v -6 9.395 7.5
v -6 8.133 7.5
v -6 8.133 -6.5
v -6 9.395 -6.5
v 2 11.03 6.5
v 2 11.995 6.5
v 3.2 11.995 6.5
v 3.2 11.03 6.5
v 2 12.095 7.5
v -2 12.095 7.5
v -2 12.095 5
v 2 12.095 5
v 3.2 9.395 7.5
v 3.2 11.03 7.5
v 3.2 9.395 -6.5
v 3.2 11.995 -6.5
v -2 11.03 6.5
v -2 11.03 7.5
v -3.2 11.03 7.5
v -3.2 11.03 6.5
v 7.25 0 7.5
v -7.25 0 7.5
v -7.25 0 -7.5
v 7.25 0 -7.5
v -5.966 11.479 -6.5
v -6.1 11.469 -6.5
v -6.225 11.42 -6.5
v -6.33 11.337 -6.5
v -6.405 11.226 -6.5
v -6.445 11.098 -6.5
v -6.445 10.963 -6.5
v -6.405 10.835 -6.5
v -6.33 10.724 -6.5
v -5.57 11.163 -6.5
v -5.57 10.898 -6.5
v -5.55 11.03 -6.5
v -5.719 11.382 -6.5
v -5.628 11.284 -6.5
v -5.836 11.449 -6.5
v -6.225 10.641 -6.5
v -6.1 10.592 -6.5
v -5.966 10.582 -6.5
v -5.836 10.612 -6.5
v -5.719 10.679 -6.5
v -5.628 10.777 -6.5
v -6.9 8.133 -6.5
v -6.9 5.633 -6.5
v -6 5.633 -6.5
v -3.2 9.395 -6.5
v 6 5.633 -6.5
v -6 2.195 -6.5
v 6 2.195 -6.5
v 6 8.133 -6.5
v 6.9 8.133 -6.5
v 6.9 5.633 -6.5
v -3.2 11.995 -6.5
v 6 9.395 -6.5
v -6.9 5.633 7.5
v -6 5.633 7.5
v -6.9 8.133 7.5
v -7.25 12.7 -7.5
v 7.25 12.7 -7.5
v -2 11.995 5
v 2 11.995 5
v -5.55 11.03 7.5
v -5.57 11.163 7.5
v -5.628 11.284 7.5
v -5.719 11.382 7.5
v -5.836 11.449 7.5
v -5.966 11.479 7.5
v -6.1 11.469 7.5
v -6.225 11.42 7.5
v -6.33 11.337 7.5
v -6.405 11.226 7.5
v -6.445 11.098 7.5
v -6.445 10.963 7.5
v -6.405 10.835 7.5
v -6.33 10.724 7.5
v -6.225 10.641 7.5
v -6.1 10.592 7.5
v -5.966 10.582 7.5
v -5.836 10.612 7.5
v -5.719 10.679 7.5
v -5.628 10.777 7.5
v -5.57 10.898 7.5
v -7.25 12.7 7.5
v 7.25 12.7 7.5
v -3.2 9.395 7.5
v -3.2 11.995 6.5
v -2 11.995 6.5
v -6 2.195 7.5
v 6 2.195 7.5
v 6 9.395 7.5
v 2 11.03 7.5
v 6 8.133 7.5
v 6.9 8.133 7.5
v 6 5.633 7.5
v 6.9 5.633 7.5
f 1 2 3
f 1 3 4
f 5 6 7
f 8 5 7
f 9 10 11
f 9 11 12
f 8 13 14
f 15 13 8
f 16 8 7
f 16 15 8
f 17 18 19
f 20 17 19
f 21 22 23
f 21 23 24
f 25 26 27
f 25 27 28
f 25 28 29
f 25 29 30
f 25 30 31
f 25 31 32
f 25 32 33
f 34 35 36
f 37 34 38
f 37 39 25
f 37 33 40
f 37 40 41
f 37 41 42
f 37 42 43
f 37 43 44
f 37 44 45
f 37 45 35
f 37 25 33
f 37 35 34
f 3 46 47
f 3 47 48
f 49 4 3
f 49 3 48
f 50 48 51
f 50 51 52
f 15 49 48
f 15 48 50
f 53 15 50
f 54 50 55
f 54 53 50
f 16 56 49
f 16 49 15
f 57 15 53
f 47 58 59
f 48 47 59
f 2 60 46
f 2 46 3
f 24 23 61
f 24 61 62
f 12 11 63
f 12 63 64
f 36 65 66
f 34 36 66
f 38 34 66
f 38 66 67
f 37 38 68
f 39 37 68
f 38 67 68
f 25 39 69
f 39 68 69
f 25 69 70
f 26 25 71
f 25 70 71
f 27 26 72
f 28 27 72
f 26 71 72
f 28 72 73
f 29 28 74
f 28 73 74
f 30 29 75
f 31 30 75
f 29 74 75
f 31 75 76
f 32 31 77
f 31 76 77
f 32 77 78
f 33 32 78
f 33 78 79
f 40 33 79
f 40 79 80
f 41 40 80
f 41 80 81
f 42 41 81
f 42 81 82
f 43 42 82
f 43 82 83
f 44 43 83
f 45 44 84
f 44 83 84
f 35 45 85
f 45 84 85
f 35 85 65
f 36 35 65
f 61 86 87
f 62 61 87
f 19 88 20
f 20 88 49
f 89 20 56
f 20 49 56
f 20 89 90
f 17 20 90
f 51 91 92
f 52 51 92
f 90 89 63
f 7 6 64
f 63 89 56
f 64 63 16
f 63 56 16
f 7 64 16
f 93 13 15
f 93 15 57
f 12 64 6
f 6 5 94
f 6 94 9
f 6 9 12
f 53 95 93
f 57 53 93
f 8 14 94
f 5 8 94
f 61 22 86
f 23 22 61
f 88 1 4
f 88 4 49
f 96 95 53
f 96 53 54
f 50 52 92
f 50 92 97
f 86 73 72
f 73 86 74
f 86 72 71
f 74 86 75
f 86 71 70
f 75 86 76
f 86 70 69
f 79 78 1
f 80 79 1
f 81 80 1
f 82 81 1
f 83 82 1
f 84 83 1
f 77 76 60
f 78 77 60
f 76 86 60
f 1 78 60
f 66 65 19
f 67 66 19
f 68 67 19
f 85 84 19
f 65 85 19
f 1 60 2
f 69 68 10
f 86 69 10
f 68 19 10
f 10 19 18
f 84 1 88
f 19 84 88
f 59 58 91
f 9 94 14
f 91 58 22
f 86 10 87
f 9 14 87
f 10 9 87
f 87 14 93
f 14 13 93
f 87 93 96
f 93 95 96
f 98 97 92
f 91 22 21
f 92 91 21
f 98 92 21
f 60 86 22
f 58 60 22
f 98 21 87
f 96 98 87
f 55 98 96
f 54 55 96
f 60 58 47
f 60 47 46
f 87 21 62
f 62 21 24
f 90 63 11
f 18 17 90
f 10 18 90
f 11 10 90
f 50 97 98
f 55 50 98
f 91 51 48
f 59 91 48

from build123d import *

# Parameters (mm, degrees)
SKETCH2_W               = 14.5
SKETCH2_H               = 15
OUTLINE_EXTRUSION_DEPTH = 12.7
SKETCH3_W               = 12
SKETCH3_H               = 7.2
SKETCH3_W_2             = 4
SKETCH3_H_2             = 1.06471969
SKETCH3_W_3             = 0.9
SKETCH3_H_3             = 2.5
CUT_EXTRUDE1_DEPTH      = 14
SKETCH5_R               = 0.45
CUT_EXTRUDE2_DEPTH      = 14
SKETCH6_W               = 4
SKETCH6_H               = 0.1
BOSS_EXTRUDE1_DEPTH     = 11.5
SKETCH7_W               = 1.2
SKETCH7_H               = 0.96471969
CUT_EXTRUDE3_DEPTH      = 13


with BuildPart() as part:
    # Sketch2 → Outline extrusion (new body)
    with BuildSketch(Plane(origin=(0, 0, 0), x_dir=(1, 0, 0), z_dir=(0, 1, 0))):
        Rectangle(SKETCH2_W, SKETCH2_H)
    extrude(amount=OUTLINE_EXTRUSION_DEPTH)

    # Sketch3 → Cut-Extrude1 (cut)
    with BuildSketch(Plane.XY.offset(7.5)):
        with Locations((0, 5.795210166)):
            Rectangle(SKETCH3_W, SKETCH3_H)
        Polygon((-3.2, 11.030490476), (-3.2, 9.395210166), (3.2, 9.395210166), (3.2, 11.030490476), (2, 11.030490476), (-2, 11.030490476), align=None)
        with Locations((0, 11.562850321)):
            Rectangle(SKETCH3_W_2, SKETCH3_H_2)
        with Locations((6.45, 6.883168125)):
            Rectangle(SKETCH3_W_3, SKETCH3_H_3)
        with Locations((-6.45, 6.883168125)):
            Rectangle(SKETCH3_W_3, SKETCH3_H_3)
    extrude(amount=-CUT_EXTRUDE1_DEPTH, mode=Mode.SUBTRACT)

    # Sketch5 → Cut-Extrude2 (cut)
    with BuildSketch(Plane.XY.offset(7.5)):
        with Locations((-6, 11.030490476)):
            Circle(SKETCH5_R)
    extrude(amount=-CUT_EXTRUDE2_DEPTH, mode=Mode.SUBTRACT)

    # Sketch6 → Boss-Extrude1 (add)
    with BuildSketch(Plane.XY.offset(-6.5)):
        with Locations((0, 12.045210166)):
            Rectangle(SKETCH6_W, SKETCH6_H)
    extrude(amount=BOSS_EXTRUDE1_DEPTH)

    # Sketch7 → Cut-Extrude3 (cut)
    with BuildSketch(Plane.XY.offset(-6.5)):
        with Locations((-2.6, 11.512850321)):
            Rectangle(SKETCH7_W, SKETCH7_H)
        with Locations((2.6, 11.512850321)):
            Rectangle(SKETCH7_W, SKETCH7_H)
    extrude(amount=CUT_EXTRUDE3_DEPTH, mode=Mode.SUBTRACT)


solid = part.part
